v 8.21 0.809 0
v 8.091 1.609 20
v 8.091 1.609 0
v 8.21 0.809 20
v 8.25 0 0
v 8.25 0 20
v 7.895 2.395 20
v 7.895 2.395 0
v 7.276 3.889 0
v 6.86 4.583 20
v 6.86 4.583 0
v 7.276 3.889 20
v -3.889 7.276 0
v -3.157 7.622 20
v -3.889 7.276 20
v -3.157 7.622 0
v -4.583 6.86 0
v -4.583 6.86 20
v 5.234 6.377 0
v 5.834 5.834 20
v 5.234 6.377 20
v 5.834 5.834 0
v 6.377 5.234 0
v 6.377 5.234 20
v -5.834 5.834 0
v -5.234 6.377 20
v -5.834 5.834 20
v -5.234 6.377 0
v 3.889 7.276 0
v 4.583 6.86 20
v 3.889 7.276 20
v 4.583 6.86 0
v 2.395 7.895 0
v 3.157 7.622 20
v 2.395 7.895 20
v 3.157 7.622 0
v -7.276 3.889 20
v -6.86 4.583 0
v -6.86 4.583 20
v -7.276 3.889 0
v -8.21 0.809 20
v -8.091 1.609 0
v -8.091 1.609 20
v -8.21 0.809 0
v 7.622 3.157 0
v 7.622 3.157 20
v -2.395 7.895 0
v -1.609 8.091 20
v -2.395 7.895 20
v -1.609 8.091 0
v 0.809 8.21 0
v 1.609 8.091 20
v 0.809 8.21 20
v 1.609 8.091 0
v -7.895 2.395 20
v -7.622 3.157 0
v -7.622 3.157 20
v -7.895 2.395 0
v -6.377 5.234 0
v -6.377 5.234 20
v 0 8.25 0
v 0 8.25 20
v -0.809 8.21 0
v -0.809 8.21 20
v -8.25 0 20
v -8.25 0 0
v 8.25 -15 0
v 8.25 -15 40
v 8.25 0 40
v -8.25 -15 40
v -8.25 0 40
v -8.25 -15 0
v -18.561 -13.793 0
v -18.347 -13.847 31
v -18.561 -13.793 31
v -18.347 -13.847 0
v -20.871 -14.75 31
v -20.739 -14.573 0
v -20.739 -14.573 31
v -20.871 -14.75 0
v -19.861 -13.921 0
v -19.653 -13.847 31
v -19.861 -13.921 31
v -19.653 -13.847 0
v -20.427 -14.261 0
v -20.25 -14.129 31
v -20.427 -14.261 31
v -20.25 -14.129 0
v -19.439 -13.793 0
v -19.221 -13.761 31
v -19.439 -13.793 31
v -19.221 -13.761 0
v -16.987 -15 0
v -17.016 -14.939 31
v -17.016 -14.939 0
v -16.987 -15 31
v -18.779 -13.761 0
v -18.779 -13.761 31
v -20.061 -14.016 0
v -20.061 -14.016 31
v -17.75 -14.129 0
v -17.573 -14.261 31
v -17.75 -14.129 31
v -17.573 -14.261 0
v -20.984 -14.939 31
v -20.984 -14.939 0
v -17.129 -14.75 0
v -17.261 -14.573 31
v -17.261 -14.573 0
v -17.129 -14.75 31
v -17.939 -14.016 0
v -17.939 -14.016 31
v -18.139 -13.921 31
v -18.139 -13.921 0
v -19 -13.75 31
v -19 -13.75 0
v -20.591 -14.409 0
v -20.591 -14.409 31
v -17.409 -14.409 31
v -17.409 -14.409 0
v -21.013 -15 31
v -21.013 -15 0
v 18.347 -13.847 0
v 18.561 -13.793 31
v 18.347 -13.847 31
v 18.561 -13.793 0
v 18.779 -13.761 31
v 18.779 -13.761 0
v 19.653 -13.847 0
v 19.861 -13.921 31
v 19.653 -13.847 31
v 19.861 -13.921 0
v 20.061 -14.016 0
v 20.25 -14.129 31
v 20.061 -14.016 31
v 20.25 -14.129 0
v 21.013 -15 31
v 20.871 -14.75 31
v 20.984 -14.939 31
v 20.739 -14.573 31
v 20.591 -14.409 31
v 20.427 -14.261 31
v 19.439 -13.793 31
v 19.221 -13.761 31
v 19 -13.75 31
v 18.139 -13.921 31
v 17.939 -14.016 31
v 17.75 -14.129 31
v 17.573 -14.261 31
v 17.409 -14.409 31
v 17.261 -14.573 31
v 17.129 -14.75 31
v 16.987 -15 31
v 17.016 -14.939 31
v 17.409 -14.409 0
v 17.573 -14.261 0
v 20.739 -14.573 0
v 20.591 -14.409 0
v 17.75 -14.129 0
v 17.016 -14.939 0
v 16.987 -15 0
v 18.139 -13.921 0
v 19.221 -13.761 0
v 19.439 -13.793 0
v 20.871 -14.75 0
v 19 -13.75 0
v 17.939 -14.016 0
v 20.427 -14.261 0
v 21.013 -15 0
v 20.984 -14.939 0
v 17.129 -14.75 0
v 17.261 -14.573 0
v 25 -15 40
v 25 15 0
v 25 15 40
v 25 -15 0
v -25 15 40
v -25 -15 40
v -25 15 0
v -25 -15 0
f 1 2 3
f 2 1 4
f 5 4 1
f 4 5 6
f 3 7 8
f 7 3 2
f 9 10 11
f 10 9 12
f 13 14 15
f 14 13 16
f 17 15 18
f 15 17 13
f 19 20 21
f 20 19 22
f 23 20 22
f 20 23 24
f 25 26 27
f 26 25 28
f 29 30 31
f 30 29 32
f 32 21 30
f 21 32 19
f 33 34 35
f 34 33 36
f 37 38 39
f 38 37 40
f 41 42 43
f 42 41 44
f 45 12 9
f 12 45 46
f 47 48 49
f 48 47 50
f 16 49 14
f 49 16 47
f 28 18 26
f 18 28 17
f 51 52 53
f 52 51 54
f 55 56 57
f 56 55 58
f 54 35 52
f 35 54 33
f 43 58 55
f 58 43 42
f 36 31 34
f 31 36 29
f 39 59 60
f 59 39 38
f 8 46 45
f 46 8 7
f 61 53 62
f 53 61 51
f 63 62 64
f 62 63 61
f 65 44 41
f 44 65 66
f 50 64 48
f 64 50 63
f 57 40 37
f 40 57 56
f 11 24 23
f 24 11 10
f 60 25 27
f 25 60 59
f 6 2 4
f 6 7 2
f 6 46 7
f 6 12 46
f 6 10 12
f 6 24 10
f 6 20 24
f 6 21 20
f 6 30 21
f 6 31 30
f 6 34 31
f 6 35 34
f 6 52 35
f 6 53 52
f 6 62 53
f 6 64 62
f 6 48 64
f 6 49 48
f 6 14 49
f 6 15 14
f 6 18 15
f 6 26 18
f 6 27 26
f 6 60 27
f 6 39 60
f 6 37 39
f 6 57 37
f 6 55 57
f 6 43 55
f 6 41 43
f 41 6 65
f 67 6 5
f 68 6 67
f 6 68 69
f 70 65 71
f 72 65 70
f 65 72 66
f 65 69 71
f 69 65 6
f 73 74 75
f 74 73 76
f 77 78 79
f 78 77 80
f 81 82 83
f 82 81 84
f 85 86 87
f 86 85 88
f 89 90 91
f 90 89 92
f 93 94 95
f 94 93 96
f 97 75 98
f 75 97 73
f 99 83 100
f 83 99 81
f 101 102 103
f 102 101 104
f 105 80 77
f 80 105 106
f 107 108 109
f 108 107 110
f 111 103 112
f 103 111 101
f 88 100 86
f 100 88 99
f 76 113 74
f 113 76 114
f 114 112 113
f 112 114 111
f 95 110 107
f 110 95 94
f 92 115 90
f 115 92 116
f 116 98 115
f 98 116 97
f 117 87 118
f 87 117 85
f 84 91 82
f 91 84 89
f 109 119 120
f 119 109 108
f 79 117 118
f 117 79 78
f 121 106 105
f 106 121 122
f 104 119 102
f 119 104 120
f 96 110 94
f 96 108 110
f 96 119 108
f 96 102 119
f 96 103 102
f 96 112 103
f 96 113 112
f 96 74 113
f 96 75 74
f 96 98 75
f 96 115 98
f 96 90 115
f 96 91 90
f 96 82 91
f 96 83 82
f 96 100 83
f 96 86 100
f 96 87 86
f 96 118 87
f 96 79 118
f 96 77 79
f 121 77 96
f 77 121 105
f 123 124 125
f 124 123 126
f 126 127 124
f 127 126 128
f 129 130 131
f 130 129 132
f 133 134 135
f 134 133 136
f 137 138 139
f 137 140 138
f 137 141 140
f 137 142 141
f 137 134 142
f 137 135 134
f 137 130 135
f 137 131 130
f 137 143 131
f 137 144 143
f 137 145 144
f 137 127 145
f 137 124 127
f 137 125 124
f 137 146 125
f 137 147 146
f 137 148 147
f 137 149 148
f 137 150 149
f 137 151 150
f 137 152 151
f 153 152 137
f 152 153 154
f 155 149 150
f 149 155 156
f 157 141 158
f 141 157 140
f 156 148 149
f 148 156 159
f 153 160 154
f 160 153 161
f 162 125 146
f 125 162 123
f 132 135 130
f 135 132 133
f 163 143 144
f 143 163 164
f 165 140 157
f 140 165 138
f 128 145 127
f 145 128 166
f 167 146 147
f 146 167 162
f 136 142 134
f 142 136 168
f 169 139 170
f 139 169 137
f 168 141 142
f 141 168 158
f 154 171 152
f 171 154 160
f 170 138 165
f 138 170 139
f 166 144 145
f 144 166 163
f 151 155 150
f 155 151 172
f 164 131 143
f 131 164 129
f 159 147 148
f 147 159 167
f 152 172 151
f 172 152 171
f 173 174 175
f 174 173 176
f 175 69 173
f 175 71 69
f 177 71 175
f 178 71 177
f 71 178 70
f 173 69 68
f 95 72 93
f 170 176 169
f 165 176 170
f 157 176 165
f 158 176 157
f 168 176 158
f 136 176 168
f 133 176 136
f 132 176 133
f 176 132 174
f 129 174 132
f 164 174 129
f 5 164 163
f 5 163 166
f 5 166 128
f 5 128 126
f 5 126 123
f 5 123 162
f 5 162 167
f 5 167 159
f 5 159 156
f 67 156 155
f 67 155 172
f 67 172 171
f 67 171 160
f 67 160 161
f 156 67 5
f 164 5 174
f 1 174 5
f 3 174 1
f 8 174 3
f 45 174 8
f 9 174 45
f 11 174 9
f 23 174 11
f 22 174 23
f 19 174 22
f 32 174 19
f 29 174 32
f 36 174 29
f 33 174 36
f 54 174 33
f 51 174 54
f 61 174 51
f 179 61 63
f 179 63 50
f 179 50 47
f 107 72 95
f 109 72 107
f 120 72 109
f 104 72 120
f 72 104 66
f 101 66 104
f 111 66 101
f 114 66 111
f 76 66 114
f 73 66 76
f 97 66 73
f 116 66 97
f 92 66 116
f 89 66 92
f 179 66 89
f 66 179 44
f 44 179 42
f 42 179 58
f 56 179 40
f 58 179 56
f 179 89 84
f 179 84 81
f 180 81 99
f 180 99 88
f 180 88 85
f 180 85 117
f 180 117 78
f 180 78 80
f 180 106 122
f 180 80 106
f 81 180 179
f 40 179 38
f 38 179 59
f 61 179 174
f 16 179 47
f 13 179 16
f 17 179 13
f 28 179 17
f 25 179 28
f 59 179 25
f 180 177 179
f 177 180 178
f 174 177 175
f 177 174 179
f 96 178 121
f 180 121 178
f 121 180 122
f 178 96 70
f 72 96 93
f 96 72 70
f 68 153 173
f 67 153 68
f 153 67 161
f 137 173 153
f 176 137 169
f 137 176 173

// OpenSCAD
// Wall-mounted 10 mL syringe holder (tip-down, printed as used)
// Block: 50 (X) x 30 (Y) x 40 (Z), centred on origin, back face at y = +15 against wall.

$fn = 64;

// ---- Block dimensions ----
W = 50;          // block width  (X)
D = 30;          // block depth   (Y)
H = 40;          // block height  (Z)

// ---- Barrel channel (vertical, full height, slides in from front) ----
bc_w   = 16.5;   // channel width (X)
bc_r   = 8.25;   // back half-circle radius (bc_w / 2)
bc_y0  = 0;      // centre of back half-circle (y)
bc_y1  = -15;    // straight sides run to the front face

// ---- Flange slot (cut in from front face) ----
fs_w   = 34;     // slot width (X, centred)
fs_z0  = 30;     // slot bottom (z)
fs_z1  = 32.6;   // slot top (z)  -> 2.6 mm tall
fs_y0  = -15;    // front face
fs_y1  = 11;     // slot back end (y)

// ---- M4 wall-screw clearance holes (through, along Y) ----
hs_d   = 4.5;    // hole diameter
hs_x   = [-19, 19];  // hole centres (x)
hs_z   = 15;         // hole centres (z)

// ---- Base block ----
module block() { translate([-W/2, -D/2, 0]) cube([W, D, H]); }

// ---- Barrel channel cutter (extends 1 mm past every face it cuts) ----
// Back half-circle (centre x=0, y=0, r=8.25) + rectangular body to the front face.
module bc_cut() { union() {
    translate([0, bc_y0, -1])
        cylinder(h = H + 2,
                 r1 = bc_r, r2 = bc_r,
                 $fn = $fn,
                 center = true);
    translate([-bc_w/2, bc_y1 - 1, -1])
        cube([bc_w, (bc_y0 - bc_y1) + 1, H + 2]);
} }

// ---- Flange slot cutter (extends 1 mm past front face and back end) ----
module fs_cut() { translate([-fs_w/2, fs_y1 - 1, fs_z0 - 1])
    cube([fs_w, (fs_y0 - fs_y1) + 1, (fs_z1 - fs_z0) + 2]); }

// ---- Screw clearance holes (extend 1 mm past front and back faces) ----
module screw_cuts() { for (i = [0 : len(hs_x) - 1])
    translate([hs_x[i], -D/2 - 1, hs_z])
        cylinder(h = D + 2,
                 r1 = hs_d / 2, r2 = hs_d / 2,
                 $fn = $fn,
                 center = true); }

// ---- Final part ----
difference() {
    block();
    bc_cut();
    fs_cut();
    screw_cuts();
}
